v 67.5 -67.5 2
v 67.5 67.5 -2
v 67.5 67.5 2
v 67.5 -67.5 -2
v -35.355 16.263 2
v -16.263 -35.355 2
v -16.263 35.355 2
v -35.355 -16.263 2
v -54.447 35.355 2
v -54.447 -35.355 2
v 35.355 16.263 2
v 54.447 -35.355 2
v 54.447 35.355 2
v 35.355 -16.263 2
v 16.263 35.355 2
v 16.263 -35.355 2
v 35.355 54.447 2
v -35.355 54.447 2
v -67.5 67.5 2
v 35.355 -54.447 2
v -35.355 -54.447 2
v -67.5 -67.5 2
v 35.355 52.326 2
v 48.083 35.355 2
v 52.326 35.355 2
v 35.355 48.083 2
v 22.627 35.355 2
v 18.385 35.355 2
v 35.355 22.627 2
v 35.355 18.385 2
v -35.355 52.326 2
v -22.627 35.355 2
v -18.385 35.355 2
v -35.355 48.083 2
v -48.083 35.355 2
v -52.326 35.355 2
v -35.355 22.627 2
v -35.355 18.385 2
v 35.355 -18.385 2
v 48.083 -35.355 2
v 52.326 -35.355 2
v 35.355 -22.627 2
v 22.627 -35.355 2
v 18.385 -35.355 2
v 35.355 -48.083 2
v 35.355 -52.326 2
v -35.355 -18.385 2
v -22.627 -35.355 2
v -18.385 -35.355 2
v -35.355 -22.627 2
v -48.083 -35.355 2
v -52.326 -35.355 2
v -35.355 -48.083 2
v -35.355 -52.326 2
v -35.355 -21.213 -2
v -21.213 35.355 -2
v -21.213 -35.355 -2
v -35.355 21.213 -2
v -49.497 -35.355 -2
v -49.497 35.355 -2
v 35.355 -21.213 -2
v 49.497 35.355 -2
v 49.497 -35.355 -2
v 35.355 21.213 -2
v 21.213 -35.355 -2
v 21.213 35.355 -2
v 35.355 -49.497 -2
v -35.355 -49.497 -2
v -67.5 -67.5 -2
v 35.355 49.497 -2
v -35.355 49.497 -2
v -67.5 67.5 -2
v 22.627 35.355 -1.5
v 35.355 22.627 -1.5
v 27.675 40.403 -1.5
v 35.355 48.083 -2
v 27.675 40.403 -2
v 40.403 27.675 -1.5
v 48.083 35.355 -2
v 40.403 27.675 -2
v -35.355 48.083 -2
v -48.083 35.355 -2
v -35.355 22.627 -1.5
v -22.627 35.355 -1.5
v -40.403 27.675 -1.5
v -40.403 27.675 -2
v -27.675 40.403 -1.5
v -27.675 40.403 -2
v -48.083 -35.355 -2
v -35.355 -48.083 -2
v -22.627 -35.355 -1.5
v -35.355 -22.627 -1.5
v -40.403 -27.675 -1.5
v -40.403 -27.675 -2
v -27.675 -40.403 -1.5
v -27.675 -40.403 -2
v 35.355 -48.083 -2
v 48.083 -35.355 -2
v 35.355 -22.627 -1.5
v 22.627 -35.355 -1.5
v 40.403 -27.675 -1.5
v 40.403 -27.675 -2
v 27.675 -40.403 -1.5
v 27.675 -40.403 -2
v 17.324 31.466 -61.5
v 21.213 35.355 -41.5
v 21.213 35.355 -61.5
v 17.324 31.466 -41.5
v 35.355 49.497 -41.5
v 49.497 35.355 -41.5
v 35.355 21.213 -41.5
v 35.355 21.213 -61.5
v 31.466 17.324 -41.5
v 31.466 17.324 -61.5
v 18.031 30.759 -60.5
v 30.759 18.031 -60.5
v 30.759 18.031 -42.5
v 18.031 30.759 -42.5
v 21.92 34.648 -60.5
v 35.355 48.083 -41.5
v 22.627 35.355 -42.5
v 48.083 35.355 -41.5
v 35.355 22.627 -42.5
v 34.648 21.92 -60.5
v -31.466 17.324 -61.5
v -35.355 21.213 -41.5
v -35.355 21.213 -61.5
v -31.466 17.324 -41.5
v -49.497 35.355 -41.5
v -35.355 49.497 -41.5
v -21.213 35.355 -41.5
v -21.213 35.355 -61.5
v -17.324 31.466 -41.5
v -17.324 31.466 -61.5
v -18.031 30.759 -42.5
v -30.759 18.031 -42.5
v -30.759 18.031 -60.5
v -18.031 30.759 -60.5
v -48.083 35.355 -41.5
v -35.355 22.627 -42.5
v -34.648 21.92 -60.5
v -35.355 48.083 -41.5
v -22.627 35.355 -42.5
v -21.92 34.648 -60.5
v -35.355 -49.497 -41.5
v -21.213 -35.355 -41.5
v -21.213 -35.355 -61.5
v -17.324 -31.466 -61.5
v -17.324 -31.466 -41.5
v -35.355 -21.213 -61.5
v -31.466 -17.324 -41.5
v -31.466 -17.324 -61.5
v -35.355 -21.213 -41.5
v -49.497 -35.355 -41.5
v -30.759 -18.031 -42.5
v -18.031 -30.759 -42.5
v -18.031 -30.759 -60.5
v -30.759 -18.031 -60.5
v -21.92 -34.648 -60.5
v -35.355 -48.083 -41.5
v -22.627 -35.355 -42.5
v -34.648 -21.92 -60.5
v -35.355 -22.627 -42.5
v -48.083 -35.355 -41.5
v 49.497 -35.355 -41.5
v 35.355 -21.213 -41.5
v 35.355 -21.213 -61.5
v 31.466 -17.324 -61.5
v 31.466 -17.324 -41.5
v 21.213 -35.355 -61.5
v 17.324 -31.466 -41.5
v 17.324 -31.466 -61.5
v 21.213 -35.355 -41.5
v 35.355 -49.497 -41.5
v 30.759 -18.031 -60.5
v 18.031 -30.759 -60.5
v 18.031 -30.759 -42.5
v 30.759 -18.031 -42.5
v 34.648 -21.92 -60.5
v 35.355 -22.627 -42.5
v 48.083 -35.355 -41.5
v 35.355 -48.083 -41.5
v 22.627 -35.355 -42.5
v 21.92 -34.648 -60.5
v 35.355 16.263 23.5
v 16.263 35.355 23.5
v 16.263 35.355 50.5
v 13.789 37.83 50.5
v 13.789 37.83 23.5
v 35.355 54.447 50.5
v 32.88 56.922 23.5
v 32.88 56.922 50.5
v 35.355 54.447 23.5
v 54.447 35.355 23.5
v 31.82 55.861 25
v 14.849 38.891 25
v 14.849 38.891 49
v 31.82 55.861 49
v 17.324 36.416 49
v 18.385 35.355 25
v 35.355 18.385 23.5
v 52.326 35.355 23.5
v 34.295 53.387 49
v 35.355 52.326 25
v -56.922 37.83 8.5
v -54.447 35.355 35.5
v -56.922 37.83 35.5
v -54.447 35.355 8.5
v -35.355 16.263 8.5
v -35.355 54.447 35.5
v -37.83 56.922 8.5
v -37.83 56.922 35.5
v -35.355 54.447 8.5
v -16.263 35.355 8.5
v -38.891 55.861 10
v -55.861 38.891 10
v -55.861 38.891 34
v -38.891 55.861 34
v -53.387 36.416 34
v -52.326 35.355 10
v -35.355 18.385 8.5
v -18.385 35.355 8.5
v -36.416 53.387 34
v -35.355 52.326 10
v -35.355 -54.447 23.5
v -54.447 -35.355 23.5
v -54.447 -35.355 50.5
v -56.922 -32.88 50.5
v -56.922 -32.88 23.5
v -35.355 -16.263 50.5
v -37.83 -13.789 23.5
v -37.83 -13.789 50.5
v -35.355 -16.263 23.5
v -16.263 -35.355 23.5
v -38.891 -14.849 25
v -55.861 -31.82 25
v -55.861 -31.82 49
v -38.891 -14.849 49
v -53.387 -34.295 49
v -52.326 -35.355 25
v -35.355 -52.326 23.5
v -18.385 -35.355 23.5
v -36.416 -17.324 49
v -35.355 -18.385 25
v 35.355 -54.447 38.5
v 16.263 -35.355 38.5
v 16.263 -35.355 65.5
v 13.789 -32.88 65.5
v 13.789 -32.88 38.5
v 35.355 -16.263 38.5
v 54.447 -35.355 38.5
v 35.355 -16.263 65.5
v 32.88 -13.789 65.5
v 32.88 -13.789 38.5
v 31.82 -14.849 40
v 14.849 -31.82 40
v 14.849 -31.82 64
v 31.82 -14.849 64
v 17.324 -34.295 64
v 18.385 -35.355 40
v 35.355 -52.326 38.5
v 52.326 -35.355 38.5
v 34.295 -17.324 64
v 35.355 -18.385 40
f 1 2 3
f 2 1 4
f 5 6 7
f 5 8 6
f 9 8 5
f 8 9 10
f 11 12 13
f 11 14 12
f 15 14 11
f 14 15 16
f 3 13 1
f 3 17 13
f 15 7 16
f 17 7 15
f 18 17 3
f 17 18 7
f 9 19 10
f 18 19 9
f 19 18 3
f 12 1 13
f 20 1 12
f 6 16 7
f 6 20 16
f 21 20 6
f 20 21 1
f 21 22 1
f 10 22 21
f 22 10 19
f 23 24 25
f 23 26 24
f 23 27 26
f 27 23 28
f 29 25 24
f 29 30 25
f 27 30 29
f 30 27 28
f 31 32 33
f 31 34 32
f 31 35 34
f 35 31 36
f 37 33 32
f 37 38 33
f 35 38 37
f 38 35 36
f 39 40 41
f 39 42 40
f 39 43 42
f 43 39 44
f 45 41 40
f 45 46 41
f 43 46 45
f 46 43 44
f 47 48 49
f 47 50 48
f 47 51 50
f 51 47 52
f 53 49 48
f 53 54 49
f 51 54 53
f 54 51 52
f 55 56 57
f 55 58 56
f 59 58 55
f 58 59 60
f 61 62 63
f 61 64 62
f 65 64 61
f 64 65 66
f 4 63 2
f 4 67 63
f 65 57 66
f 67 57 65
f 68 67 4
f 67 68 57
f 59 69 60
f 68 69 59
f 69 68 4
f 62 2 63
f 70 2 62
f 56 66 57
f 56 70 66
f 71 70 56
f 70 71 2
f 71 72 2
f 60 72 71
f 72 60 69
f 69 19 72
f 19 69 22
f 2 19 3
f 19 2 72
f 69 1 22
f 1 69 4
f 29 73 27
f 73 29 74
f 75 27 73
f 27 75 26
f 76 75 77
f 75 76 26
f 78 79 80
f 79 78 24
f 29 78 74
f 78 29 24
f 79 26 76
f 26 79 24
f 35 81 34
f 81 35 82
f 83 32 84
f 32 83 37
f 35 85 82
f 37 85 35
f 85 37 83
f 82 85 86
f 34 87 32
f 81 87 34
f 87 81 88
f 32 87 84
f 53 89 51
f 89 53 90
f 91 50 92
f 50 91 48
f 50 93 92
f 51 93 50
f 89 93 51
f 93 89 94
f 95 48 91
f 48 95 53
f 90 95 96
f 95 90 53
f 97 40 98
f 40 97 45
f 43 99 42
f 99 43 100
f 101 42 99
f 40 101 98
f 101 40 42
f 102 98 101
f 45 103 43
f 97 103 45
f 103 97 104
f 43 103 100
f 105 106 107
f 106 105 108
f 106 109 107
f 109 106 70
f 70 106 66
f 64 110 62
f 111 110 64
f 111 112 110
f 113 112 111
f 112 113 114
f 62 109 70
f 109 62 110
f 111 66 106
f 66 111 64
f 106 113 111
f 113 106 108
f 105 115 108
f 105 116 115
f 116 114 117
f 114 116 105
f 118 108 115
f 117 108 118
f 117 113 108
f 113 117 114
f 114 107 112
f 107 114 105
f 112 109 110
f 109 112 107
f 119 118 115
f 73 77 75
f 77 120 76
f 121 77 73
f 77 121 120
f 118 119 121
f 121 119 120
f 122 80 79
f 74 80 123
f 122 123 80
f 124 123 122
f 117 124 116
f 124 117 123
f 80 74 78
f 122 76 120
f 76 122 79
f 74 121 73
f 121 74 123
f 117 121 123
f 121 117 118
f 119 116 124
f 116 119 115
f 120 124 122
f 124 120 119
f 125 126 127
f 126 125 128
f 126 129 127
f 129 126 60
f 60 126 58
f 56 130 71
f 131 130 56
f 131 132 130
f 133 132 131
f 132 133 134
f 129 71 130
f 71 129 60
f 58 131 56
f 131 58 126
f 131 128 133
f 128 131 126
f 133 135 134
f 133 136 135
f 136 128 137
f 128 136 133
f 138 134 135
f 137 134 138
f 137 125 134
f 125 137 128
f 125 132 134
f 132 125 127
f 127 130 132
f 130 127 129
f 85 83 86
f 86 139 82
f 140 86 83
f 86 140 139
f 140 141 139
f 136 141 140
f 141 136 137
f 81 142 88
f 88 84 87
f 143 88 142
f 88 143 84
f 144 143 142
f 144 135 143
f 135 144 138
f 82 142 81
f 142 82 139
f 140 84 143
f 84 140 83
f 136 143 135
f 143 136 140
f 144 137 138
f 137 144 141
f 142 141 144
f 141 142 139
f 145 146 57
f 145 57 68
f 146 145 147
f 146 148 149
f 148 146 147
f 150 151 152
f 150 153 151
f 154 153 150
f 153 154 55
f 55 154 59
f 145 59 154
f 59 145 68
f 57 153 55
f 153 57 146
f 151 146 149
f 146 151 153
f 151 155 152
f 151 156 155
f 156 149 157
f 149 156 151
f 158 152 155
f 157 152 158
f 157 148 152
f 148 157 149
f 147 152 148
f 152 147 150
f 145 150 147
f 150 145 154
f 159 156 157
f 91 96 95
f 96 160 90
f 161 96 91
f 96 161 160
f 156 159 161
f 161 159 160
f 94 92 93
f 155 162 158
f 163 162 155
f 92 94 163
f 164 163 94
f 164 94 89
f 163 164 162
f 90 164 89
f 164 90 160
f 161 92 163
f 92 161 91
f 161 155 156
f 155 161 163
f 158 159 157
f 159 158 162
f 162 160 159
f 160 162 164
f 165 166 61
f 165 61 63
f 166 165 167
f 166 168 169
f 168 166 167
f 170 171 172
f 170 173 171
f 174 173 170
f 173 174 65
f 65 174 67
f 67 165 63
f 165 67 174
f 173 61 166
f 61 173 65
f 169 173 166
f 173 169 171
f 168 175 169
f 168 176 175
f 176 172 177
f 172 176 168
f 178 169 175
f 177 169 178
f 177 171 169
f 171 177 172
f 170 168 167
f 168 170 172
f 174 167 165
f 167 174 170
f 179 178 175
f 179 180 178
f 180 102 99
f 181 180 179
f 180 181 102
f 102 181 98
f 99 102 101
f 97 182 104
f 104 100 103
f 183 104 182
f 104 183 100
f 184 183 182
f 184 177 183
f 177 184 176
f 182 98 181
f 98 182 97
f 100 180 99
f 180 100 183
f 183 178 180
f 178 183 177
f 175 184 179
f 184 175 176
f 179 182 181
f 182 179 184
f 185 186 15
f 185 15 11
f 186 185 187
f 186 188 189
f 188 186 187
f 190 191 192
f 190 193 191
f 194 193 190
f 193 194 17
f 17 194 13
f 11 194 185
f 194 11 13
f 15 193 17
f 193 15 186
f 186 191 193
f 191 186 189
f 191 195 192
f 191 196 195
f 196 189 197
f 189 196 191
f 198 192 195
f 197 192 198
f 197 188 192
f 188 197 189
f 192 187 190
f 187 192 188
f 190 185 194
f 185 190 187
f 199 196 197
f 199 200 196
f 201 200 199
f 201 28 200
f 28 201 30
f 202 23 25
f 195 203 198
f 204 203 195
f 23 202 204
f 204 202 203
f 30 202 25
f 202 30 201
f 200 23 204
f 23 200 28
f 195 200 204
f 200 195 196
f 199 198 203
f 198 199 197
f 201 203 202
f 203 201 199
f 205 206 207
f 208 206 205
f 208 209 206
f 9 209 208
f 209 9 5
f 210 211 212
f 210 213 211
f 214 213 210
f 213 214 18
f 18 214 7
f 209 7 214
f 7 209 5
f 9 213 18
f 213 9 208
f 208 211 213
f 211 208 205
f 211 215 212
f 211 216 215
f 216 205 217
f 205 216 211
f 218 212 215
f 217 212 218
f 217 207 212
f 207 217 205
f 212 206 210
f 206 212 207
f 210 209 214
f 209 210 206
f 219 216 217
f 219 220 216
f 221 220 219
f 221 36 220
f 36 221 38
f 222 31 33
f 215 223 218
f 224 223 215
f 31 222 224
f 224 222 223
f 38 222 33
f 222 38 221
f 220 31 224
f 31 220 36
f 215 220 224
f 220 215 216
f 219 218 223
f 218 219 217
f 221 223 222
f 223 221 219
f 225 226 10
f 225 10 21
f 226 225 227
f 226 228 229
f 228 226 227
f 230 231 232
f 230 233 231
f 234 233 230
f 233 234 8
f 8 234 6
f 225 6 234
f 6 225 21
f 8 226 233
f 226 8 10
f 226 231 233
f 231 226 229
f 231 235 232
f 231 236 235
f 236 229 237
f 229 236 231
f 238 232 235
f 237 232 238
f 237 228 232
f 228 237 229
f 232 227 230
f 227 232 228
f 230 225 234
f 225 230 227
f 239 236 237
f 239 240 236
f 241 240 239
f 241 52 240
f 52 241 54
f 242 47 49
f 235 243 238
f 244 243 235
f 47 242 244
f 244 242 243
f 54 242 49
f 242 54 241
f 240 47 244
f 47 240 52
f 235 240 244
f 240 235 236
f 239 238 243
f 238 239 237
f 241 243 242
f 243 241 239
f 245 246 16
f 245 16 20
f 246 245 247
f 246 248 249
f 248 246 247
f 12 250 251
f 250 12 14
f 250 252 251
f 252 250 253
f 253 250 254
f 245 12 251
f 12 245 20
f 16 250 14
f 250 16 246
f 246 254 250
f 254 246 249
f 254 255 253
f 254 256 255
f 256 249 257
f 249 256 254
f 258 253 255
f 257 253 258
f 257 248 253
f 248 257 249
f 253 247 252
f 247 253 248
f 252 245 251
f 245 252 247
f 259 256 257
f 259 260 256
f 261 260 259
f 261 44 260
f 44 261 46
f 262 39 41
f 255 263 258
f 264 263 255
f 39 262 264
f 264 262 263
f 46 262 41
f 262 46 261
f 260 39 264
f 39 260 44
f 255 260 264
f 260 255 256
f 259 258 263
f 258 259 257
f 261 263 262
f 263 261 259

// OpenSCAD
// file: ../../shared/half_periscope.scad
diameter=10;
horizontal_leg=3;
vertical_leg=7;
wall_thickness=0.5;

module half_periscope(
    d=diameter,
    h=horizontal_leg,
    v=vertical_leg,
    w=wall_thickness
) {
  translate([-d/2,-(h+d/2),-d-v])
    rotate([90,0,90])
        difference(){
            linear_extrude(d)
                polygon([[0,0], [h,0], [d+h,d], [d+h,d+v],[h,d+v],[h,d],[0,d]]);
            translate([0,0,w])
                linear_extrude(d-w-w)
                    polygon([[-w,w], [h,w], [d+h-w,d], [d+h-w,d+v+w],[h+w,d+v+w],[h+w,d-w],[-w,d-w]]);
    }  
}

half_periscope();
// main file
cabin_width=125;
roof_thickness=4;
roof_overhang=5;
lower_periscope_diameter=20;
lower_periscope_h=5;
lower_periscope_v=40;
lower_periscope_wall_thickness=1;
upper_periscope_diameter=27;
upper_periscope_h=3;
upper_periscope_v_low=10;
upper_periscope_v_medium=25;
upper_periscope_v_high=40;
upper_periscope_wall_thickness=1.5;
periscope_distance_from_center=50;

use<../../shared/half_periscope.scad>

module roof(
    cw=cabin_width,
    ro=roof_overhang,
    rt=roof_thickness,
    lpd=lower_periscope_diameter,
    lpv=lower_periscope_v,
    lph=lower_periscope_h,
    lpw=lower_periscope_wall_thickness,
    upd=upper_periscope_diameter,
    upvl=upper_periscope_v_low,
    upvm=upper_periscope_v_medium,
    upvh=upper_periscope_v_high,
    uph=upper_periscope_h,
    upw=upper_periscope_wall_thickness,
    pdc=periscope_distance_from_center
){
    module lower_periscope(r)
    {
       rotate(r)
          translate ([pdc,0,0.5-(rt/2)])
            rotate(270)
                half_periscope(lpd,lph+0.5,lpv,lpw);
    }
    
    module upper_periscope(r,v,r2)
    {
       rotate(r)
          translate ([pdc,0,0.5-(rt/2)])
            rotate([180,0,r2])
                half_periscope(upd,uph+0.5,v,upw);
    }
    
    module punch(r) {
        rotate(r)
            translate ([pdc,0,0])
                cube(lpd-(2*lpw), true);
    }
    
    union(){
        difference(){
            cube([cw+(2*ro),cw+(2*ro),rt], true);
            punch(45);
            punch(135);
            punch(225);
            punch(315);
        }
        lower_periscope(45);
        lower_periscope(135);
        lower_periscope(225);
        lower_periscope(315);
        upper_periscope(45,upvm,0);
        upper_periscope(135,upvl,270);
        upper_periscope(225,upvm,180);
        upper_periscope(315,upvh,90);
    }
    

}

roof();
